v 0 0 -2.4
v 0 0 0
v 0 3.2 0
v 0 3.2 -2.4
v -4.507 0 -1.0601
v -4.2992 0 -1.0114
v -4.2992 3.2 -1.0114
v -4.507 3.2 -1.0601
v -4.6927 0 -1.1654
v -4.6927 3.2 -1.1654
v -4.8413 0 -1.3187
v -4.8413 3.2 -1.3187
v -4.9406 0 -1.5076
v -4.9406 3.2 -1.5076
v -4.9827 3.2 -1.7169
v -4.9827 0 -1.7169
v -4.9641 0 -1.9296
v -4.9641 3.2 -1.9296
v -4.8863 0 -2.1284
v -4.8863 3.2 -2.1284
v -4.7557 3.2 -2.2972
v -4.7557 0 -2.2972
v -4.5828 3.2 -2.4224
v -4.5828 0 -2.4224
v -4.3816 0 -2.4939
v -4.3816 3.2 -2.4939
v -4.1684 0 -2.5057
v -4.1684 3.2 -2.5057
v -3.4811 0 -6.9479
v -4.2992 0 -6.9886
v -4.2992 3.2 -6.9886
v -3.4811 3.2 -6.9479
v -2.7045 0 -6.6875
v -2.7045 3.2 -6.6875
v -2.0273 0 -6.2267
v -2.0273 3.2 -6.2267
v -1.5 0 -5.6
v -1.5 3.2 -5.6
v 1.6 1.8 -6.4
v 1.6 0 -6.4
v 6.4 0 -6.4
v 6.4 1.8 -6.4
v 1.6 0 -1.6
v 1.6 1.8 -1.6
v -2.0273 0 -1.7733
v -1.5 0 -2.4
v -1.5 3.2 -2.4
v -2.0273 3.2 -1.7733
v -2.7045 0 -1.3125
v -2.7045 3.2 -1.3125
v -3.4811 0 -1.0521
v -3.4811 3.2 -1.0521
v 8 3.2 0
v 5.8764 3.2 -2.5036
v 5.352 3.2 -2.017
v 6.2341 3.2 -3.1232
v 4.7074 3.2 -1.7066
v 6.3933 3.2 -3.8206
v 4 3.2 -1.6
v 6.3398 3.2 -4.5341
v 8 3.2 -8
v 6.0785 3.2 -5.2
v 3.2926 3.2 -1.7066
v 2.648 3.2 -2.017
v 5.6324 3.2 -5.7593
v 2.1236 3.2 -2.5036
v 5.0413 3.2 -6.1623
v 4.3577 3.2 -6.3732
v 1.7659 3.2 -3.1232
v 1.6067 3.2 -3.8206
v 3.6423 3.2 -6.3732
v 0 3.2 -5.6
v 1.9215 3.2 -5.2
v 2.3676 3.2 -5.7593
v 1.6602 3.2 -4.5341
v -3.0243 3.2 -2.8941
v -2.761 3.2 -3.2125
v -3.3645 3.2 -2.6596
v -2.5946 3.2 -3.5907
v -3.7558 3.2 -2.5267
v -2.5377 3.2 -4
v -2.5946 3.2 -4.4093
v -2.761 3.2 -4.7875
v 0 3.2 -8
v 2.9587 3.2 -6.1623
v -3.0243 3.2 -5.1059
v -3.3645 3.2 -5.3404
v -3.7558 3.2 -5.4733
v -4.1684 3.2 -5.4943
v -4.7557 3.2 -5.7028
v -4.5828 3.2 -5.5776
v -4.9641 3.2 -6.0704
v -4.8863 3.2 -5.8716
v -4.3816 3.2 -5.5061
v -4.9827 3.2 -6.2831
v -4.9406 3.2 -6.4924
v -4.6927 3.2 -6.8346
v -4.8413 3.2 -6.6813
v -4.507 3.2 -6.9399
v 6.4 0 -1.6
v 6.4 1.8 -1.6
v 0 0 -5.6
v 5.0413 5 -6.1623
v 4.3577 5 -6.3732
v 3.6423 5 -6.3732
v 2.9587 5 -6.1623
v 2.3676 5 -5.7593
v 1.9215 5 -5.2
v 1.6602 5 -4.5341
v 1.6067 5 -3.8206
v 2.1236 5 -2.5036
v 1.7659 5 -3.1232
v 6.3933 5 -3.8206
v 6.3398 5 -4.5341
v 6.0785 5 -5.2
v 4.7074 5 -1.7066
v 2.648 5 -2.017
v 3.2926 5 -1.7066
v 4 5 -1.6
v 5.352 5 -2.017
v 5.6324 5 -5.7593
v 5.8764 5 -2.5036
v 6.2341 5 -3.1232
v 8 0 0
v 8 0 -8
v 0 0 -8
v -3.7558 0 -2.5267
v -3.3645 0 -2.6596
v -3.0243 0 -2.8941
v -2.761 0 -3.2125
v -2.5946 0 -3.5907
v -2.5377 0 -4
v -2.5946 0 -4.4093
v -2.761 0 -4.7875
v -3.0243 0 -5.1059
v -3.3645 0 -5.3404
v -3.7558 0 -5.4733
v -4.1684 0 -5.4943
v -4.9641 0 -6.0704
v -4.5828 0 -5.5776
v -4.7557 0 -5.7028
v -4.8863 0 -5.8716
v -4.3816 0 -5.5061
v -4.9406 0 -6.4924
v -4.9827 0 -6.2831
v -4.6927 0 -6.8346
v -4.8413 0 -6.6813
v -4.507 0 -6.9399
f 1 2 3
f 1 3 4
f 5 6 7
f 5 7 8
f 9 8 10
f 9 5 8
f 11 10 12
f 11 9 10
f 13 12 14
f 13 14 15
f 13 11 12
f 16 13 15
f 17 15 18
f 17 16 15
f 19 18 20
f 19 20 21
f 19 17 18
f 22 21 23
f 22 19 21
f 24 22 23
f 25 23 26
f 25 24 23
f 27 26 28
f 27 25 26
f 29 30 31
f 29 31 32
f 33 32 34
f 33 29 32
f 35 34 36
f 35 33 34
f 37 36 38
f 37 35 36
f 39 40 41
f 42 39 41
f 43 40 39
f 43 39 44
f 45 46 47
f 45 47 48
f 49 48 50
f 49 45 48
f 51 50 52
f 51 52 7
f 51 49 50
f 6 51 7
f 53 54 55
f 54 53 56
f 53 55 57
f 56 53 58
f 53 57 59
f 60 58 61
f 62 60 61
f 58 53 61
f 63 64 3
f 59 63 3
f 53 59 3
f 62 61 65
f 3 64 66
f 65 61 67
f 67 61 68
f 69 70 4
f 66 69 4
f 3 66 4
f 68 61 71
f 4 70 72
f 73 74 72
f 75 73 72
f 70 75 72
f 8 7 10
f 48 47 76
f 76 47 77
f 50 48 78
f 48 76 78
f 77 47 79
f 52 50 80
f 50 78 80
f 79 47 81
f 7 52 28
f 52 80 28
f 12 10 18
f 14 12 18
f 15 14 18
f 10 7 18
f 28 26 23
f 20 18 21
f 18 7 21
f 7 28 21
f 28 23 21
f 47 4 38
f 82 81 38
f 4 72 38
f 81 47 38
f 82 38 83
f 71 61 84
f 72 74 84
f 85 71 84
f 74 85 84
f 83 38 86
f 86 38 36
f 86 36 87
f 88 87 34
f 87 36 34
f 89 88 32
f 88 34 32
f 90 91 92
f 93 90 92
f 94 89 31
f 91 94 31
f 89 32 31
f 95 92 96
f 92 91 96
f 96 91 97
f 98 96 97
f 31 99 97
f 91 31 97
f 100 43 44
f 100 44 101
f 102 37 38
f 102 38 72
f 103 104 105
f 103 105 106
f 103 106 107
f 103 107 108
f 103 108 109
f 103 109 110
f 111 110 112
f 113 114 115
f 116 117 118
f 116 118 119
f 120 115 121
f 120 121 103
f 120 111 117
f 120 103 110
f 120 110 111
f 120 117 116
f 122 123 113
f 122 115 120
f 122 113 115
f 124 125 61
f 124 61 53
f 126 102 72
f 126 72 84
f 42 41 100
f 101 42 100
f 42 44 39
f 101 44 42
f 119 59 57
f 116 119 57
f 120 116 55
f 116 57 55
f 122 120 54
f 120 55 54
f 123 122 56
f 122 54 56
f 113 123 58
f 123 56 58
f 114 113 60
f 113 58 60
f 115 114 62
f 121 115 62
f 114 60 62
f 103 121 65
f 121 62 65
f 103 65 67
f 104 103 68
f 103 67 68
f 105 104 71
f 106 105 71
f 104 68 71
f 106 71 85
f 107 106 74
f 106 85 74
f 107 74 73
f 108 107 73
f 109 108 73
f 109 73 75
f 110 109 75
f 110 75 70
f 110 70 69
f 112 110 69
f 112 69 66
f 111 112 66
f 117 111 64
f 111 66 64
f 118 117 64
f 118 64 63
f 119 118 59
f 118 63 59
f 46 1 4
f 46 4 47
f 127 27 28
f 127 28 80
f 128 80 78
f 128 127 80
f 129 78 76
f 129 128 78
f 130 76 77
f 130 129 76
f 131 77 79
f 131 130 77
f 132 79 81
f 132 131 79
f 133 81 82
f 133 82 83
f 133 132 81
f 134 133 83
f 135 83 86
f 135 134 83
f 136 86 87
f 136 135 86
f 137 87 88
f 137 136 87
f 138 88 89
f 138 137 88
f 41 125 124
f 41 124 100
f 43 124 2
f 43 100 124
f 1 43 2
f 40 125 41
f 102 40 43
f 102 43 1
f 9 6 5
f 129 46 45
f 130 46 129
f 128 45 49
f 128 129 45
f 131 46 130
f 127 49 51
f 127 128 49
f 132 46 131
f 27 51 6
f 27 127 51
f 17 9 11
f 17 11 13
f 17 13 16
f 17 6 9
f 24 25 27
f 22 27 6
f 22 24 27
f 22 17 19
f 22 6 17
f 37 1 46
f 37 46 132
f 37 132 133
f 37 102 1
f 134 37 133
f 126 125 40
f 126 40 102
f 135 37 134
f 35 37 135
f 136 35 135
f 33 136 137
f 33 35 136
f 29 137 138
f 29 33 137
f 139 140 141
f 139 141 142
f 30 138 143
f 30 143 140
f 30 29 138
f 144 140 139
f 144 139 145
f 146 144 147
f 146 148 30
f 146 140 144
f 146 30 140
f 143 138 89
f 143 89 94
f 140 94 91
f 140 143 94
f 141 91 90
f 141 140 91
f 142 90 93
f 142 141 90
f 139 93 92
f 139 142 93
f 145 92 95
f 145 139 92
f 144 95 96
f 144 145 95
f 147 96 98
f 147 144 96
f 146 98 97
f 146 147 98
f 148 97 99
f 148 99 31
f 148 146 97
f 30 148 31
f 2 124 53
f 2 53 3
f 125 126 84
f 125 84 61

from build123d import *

# Parameters (mm, degrees)
BOSS_EXTRUDE1_DEPTH = 3.2
SKETCH2_R           = 2.4
BOSS_EXTRUDE2_DEPTH = 1.8
SKETCH3_W           = 4.8
SKETCH3_H           = 4.8
CUT_EXTRUDE1_DEPTH  = 1.8


with BuildPart() as part:
    # Sketch1 → Boss-Extrude1 (new body)
    with BuildSketch(Plane(origin=(0, 0, 0), x_dir=(1, 0, 0), z_dir=(0, 1, 0))):
        with BuildLine():
            Line((0, 2.4), (-1.5, 2.4))
            ThreePointArc((-1.5, 2.4), (-2.704535849, 1.312504512), (-4.299182736, 1.011415906))
            ThreePointArc((-4.299182736, 1.011415906), (-4.980961953, 1.823928736), (-4.168449122, 2.505707953))
            ThreePointArc((-4.168449122, 2.505707953), (-2.537715508, 4), (-4.168449122, 5.494292047))
            ThreePointArc((-4.168449122, 5.494292047), (-4.980961953, 6.176071264), (-4.299182736, 6.988584094))
            ThreePointArc((-4.299182736, 6.988584094), (-2.704535849, 6.687495488), (-1.5, 5.6))
            Line((-1.5, 5.6), (0, 5.6))
            Line((0, 5.6), (0, 8))
            Line((0, 8), (8, 8))
            Line((8, 8), (8, 0))
            Line((8, 0), (0, 0))
            Line((0, 0), (0, 2.4))
        make_face()
    extrude(amount=BOSS_EXTRUDE1_DEPTH)

    # Sketch2 → Boss-Extrude2 (add)
    with BuildSketch(Plane(origin=(0, 3.2, 0), x_dir=(1, 0, 0), z_dir=(0, 1, 0))):
        with Locations((4, 4)):
            Circle(SKETCH2_R)
    extrude(amount=BOSS_EXTRUDE2_DEPTH)

    # Sketch3 → Cut-Extrude1 (cut)
    with BuildSketch(Plane.XZ):
        with Locations((4, -4)):
            Rectangle(SKETCH3_W, SKETCH3_H)
    extrude(amount=-CUT_EXTRUDE1_DEPTH, mode=Mode.SUBTRACT)


solid = part.part
